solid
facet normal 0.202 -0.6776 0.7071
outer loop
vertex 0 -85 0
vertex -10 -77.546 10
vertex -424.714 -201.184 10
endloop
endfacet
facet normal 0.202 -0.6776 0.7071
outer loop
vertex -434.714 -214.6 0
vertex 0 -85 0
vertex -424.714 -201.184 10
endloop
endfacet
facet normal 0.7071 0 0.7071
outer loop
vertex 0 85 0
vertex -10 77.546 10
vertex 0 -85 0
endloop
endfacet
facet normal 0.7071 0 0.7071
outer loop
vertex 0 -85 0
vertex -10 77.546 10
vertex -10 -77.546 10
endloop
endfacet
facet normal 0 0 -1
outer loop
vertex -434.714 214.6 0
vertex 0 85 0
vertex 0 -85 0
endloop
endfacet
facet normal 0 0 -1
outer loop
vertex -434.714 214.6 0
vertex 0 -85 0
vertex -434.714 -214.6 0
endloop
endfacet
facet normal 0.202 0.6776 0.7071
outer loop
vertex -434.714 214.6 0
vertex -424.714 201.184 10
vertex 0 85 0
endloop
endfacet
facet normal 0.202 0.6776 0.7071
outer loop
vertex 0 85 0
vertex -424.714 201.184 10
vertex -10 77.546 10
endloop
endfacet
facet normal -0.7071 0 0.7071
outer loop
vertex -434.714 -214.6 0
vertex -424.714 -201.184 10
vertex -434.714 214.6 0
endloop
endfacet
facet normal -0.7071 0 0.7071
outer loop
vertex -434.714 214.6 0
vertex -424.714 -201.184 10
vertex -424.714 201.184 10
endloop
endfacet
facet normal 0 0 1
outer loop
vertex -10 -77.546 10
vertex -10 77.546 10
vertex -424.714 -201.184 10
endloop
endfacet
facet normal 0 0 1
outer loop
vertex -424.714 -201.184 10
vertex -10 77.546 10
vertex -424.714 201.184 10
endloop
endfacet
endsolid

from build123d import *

# Parameters (mm, degrees)
AUFSATZ_LINEAR_AUSTRAGEN1_DEPTH = 10
FASE1_SIZE                      = 10


with BuildPart() as part:
    # Skizze1 → Aufsatz-Linear austragen1 (new body)
    with BuildSketch(Plane.XY):
        Polygon((-434.714346895, -214.6), (-434.714346895, 214.6), (0, 85), (0, -85), align=None)
    extrude(amount=AUFSATZ_LINEAR_AUSTRAGEN1_DEPTH)

    # Fase1
    fase1_edges = [part.edges().sort_by_distance(p)[0] for p in [
        (-434.714346895, 0, 10),
        (-217.357173448, 149.8, 10),
        (0, 0, 10),
        (-217.357173448, -149.8, 10),
    ]]
    chamfer(fase1_edges, length=FASE1_SIZE - 0.0001)  # a hair under: the kernel refuses the full size


solid = part.part
